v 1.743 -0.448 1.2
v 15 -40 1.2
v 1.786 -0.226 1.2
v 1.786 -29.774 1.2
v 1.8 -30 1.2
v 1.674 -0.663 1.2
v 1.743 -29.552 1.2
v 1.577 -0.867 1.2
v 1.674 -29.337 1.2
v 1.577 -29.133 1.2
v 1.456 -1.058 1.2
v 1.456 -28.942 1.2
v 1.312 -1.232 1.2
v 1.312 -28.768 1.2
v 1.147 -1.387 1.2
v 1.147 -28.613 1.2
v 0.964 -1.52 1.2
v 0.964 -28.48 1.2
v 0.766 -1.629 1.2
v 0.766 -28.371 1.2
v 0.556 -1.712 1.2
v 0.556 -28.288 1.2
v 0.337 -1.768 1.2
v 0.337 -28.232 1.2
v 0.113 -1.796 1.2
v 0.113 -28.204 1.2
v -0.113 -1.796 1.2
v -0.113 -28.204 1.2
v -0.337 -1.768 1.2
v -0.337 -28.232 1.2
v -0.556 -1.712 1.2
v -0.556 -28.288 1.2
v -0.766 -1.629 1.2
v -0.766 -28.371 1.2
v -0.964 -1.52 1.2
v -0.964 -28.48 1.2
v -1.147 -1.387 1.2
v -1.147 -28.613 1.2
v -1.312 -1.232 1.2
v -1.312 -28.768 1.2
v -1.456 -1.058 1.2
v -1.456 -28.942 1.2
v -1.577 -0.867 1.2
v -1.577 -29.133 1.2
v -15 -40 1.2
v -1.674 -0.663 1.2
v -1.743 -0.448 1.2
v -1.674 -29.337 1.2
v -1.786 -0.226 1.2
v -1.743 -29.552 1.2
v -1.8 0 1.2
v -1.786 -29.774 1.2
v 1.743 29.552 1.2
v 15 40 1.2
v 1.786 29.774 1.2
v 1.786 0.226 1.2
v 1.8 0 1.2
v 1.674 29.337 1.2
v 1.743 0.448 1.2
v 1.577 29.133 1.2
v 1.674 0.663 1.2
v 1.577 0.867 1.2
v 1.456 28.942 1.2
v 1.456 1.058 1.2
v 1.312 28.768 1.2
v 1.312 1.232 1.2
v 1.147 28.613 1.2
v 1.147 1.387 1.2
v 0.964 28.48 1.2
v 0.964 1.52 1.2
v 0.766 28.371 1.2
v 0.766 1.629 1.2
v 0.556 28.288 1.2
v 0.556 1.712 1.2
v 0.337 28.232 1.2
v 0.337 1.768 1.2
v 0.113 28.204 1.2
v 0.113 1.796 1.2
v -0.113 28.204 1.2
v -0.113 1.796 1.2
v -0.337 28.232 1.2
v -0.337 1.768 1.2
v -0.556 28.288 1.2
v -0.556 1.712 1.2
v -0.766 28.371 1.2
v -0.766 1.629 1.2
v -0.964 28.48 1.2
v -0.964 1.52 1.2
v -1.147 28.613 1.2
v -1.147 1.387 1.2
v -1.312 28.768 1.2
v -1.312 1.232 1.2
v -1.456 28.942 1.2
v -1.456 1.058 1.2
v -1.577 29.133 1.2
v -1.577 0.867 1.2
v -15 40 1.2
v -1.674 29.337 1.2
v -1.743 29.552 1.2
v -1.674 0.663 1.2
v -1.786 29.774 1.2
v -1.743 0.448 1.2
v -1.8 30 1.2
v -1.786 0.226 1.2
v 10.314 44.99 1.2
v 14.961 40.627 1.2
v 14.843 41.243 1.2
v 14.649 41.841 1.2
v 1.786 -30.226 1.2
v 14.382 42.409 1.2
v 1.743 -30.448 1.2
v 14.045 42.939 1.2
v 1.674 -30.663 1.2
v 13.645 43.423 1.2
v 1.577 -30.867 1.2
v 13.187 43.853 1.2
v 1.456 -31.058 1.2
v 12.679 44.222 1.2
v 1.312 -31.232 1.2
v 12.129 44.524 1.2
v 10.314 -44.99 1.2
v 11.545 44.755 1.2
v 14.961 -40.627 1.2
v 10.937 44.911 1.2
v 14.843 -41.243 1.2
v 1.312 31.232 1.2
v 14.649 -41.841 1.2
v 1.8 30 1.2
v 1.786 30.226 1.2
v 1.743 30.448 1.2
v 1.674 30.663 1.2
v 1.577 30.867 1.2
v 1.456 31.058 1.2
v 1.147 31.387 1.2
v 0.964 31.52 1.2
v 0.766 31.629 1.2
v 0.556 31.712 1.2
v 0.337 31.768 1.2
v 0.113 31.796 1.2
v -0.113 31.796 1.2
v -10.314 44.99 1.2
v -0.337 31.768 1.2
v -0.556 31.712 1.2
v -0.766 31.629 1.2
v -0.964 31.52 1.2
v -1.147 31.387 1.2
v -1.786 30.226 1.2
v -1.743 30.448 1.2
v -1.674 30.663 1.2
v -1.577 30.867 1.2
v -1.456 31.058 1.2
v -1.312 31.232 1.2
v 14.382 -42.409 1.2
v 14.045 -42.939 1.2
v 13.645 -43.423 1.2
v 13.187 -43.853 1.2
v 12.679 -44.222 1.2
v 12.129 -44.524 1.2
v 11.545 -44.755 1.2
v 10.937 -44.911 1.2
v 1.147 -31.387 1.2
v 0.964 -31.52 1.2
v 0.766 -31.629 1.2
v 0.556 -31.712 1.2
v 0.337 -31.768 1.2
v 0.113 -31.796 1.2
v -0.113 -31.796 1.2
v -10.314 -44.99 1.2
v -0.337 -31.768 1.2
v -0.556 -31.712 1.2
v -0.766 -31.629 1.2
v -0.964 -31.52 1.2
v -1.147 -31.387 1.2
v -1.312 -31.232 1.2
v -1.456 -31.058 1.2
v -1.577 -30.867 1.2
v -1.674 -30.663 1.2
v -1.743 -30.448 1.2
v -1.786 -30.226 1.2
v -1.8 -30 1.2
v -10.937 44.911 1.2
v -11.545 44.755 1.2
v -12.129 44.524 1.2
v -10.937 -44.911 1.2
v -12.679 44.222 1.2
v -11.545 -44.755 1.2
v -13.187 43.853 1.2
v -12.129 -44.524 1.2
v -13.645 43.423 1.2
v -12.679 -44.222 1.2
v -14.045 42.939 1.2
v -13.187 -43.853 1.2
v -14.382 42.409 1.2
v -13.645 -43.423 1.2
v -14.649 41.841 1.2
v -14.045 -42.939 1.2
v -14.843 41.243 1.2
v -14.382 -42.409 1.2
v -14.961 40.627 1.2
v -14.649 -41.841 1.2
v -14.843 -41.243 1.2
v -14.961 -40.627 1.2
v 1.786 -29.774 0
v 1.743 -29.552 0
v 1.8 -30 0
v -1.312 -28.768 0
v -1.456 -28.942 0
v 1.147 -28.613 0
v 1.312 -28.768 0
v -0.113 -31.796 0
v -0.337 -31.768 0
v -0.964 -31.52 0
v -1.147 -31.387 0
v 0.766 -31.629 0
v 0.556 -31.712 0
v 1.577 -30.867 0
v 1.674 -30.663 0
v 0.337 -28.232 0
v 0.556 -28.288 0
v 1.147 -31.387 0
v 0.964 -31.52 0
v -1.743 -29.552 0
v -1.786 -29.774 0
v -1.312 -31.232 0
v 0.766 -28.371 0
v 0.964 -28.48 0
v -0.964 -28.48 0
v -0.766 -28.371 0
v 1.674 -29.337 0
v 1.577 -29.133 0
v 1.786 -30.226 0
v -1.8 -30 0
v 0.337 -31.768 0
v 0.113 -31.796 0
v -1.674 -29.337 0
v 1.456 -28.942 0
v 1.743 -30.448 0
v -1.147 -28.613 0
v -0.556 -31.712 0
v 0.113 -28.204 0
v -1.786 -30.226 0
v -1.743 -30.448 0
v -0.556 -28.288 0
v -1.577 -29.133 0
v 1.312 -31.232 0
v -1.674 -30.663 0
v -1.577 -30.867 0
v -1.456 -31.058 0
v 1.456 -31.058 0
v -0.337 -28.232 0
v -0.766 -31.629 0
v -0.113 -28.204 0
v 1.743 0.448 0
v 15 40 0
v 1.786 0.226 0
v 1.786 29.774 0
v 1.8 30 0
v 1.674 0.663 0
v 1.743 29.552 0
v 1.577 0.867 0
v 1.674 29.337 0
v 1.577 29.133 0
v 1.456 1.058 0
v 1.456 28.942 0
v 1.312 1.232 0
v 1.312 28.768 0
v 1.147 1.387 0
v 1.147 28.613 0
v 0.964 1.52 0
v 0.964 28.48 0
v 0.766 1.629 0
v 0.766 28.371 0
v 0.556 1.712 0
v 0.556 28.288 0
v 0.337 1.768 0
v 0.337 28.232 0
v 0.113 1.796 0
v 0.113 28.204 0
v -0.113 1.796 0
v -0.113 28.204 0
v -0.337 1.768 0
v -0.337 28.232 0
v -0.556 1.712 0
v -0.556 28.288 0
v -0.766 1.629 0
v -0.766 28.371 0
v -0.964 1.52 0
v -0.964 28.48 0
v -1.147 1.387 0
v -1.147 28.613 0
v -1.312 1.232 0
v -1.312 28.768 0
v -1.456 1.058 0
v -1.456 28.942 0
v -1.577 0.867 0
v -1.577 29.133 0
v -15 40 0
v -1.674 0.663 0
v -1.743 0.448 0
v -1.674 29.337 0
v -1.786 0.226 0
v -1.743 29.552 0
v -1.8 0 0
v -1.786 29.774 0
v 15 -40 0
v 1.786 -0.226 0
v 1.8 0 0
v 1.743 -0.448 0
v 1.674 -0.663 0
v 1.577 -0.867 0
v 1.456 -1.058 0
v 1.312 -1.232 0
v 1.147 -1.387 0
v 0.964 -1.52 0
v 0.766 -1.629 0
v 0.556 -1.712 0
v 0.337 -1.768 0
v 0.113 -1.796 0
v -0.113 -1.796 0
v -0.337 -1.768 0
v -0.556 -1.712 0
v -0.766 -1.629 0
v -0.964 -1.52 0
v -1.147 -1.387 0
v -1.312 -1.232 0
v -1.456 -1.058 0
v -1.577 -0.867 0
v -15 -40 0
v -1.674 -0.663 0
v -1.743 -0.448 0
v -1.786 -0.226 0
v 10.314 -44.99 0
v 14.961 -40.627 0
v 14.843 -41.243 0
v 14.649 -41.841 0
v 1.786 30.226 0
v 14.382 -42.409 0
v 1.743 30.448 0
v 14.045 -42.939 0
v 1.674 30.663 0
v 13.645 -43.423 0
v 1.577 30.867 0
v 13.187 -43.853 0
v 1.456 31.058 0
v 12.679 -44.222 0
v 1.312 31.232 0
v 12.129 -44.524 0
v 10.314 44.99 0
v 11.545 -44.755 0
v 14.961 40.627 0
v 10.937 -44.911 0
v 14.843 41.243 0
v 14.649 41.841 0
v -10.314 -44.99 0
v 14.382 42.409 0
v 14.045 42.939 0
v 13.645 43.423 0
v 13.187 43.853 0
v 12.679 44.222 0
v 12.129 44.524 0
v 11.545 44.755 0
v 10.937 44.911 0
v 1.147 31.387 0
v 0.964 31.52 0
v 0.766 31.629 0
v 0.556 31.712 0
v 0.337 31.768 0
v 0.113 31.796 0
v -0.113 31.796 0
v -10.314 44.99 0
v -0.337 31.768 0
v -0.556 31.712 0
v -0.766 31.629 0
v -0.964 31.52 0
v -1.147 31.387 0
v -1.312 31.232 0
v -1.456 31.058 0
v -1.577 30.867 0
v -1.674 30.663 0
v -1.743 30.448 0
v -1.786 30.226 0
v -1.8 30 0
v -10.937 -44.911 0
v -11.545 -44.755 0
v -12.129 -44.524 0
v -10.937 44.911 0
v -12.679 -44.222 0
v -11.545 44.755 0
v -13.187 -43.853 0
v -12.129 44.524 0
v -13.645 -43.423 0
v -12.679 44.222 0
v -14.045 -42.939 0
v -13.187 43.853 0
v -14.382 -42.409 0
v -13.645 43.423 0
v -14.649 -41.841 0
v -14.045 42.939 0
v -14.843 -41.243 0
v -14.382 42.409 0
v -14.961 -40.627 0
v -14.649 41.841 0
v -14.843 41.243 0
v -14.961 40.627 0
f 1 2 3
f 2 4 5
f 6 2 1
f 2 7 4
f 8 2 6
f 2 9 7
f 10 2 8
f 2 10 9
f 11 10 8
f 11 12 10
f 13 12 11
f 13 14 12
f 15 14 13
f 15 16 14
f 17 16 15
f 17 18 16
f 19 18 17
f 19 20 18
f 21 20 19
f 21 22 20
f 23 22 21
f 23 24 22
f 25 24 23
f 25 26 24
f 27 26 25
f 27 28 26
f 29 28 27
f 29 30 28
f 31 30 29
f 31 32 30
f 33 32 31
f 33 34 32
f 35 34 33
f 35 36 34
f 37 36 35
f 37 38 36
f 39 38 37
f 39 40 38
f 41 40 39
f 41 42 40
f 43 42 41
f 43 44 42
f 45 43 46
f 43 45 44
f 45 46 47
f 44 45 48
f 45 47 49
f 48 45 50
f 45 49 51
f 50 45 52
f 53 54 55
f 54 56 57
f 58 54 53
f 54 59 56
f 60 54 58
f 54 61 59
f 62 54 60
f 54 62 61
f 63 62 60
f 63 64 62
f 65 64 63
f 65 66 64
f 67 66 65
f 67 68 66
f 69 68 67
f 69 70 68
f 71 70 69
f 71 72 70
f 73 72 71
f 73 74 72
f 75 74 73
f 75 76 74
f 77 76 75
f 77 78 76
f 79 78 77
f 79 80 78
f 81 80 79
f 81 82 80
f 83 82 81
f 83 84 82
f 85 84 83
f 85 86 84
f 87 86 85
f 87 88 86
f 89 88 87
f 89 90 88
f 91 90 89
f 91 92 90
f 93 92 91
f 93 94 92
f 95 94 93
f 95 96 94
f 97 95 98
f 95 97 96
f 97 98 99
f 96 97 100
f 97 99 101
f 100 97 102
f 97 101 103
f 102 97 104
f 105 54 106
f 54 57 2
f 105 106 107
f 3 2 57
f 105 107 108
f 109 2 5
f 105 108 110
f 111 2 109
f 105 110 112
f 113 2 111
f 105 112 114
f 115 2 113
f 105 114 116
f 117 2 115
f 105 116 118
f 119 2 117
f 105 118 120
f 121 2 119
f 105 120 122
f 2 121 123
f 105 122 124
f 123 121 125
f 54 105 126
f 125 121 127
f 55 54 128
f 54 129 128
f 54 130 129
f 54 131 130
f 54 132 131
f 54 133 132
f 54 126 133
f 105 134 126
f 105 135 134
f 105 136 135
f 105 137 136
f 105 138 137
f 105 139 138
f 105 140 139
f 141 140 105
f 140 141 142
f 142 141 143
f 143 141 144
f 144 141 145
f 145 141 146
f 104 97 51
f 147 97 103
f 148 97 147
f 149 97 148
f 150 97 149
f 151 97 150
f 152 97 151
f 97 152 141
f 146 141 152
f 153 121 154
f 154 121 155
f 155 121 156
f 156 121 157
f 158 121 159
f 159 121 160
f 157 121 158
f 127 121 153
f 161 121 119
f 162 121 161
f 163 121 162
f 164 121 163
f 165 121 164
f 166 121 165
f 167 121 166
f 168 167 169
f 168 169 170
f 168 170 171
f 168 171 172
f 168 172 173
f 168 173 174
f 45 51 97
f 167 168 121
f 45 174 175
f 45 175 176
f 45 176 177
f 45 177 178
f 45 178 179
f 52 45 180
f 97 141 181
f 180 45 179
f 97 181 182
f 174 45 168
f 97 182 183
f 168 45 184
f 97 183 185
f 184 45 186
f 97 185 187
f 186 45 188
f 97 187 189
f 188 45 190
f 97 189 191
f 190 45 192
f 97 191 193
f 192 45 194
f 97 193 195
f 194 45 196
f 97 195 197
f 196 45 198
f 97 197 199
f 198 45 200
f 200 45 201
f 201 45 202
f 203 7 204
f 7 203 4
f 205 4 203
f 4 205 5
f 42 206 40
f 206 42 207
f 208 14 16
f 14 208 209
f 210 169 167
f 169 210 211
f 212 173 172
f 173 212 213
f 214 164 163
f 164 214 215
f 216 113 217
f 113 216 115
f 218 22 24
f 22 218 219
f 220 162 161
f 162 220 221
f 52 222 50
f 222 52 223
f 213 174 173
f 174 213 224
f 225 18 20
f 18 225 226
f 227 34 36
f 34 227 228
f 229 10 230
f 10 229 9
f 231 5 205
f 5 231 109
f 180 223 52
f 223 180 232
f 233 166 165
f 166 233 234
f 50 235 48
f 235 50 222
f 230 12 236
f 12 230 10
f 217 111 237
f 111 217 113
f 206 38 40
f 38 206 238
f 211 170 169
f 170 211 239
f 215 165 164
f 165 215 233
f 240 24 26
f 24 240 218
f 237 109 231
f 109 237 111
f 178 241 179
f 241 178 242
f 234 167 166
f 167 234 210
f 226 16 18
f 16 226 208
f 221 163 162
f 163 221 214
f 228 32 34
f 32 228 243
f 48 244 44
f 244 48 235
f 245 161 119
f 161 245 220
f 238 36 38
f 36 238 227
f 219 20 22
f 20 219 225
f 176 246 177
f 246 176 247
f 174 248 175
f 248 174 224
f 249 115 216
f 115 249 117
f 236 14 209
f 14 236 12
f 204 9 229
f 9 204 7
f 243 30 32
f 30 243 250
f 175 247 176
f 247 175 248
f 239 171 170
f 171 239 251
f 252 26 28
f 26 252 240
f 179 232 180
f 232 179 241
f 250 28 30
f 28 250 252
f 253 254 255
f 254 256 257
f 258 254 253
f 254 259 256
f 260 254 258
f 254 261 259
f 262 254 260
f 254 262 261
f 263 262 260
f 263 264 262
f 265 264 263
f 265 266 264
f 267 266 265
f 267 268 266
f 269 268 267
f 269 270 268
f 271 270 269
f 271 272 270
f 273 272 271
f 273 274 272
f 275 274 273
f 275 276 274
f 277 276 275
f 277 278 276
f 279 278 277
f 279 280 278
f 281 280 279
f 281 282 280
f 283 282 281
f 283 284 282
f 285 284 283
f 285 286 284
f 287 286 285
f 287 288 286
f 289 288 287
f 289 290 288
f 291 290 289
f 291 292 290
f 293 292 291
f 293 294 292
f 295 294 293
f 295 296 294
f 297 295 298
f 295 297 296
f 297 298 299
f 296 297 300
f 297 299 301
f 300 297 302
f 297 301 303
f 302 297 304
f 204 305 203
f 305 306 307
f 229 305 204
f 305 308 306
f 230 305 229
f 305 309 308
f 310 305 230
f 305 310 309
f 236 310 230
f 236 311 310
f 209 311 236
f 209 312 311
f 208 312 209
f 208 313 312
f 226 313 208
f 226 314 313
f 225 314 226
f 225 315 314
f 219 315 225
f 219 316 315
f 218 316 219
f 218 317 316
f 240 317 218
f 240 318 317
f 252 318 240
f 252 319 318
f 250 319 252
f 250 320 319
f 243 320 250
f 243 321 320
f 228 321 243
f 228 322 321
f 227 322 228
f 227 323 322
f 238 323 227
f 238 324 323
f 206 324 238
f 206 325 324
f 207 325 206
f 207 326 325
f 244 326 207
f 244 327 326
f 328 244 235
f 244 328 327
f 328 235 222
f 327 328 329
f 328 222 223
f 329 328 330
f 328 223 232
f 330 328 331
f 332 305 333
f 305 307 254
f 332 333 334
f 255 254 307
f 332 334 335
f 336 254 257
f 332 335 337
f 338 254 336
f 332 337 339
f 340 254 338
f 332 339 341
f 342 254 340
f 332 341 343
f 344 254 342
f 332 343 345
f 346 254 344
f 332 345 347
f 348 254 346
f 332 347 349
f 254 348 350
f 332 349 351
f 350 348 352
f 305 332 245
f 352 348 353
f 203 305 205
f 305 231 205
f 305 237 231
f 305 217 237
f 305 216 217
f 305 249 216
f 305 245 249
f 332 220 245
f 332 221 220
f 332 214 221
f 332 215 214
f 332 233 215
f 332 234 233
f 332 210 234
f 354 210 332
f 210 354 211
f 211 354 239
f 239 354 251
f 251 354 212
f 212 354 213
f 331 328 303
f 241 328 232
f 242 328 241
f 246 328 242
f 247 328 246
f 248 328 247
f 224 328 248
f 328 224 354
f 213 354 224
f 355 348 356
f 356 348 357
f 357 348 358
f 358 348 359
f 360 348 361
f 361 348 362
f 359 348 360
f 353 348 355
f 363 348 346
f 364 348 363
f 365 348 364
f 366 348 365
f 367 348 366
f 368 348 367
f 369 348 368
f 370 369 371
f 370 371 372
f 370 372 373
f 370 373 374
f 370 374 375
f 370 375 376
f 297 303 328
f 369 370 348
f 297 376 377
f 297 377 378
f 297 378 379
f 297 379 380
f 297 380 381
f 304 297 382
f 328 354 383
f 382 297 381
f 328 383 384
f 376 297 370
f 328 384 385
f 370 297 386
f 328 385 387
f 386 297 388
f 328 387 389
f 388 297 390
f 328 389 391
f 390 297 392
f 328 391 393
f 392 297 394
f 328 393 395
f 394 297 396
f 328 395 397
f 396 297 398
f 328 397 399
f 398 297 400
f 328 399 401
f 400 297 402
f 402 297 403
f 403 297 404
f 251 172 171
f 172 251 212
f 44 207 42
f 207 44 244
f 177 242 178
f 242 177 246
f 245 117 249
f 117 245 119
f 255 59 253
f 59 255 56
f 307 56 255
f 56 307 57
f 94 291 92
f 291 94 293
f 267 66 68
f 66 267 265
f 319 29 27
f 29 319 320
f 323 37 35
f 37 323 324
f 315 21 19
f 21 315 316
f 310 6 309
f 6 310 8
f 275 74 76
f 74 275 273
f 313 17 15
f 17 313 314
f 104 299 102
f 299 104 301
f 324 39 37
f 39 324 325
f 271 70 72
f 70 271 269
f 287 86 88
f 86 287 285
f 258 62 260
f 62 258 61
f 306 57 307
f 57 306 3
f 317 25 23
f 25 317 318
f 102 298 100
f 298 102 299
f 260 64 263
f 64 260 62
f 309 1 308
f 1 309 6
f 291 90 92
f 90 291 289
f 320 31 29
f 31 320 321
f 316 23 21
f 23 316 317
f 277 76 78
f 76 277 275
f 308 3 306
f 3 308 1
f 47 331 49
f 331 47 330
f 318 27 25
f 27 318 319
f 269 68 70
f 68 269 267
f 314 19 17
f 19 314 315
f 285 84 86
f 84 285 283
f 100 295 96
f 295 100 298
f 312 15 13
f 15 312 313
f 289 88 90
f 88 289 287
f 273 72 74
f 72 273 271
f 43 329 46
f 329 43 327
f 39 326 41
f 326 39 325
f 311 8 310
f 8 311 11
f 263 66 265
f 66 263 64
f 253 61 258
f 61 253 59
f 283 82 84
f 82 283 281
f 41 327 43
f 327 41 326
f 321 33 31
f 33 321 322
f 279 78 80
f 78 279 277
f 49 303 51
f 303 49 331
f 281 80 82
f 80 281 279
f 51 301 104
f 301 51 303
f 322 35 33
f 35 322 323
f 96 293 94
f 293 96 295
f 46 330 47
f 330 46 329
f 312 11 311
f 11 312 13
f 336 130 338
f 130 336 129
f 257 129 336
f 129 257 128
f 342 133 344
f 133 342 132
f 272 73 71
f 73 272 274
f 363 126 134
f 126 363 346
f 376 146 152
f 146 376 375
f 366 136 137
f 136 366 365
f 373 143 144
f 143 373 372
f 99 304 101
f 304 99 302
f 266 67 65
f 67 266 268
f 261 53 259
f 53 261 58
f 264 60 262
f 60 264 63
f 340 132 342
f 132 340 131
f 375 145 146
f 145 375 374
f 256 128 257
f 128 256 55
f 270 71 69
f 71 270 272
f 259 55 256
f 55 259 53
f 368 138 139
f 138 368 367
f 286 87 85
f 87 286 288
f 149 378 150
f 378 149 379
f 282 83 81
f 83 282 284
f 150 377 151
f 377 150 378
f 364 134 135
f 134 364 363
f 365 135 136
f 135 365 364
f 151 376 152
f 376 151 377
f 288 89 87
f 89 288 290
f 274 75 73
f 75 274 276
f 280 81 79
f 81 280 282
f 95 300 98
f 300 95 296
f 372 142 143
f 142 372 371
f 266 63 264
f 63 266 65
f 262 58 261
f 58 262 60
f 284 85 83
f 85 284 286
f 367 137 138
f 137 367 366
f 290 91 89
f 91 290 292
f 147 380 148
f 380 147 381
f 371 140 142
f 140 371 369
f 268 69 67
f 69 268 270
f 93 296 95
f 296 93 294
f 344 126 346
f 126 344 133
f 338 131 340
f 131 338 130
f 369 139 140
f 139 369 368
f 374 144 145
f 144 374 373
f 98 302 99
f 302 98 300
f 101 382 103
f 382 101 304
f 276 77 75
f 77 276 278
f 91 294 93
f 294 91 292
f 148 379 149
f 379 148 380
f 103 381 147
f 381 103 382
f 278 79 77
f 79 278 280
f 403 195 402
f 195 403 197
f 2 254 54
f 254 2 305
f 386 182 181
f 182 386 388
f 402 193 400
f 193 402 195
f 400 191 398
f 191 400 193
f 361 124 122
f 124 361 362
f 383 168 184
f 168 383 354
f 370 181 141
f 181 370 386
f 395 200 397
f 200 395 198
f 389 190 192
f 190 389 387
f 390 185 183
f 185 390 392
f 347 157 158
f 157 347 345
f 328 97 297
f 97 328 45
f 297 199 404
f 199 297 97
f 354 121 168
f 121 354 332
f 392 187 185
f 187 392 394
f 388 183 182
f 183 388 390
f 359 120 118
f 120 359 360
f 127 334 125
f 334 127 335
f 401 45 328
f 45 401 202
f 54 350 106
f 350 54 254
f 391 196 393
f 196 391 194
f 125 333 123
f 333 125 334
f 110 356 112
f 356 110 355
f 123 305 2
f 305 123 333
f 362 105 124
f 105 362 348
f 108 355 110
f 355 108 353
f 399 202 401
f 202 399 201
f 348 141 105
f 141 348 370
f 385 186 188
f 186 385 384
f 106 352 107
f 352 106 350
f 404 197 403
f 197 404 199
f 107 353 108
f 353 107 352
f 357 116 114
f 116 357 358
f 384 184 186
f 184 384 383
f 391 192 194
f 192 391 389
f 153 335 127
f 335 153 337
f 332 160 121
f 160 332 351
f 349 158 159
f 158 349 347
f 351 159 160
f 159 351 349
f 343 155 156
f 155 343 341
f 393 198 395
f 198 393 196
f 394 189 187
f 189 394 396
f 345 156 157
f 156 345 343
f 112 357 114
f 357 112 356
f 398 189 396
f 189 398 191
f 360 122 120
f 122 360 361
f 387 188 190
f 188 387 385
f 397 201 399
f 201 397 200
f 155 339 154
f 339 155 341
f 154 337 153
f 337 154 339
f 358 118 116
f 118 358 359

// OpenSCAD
$fn = 50;


difference() {
	union() {
		hull() {
			translate(v = [-10.0000000000, 40.0000000000, 0]) {
				cylinder(h = 45, r = 5);
			}
			translate(v = [10.0000000000, 40.0000000000, 0]) {
				cylinder(h = 45, r = 5);
			}
			translate(v = [-10.0000000000, -40.0000000000, 0]) {
				cylinder(h = 45, r = 5);
			}
			translate(v = [10.0000000000, -40.0000000000, 0]) {
				cylinder(h = 45, r = 5);
			}
		}
	}
	union() {
		translate(v = [0, 0, 1.2000000000]) {
			hull() {
				translate(v = [-10.0000000000, 40.0000000000, 0]) {
					cylinder(h = 43.8000000000, r = 3.8000000000);
				}
				translate(v = [10.0000000000, 40.0000000000, 0]) {
					cylinder(h = 43.8000000000, r = 3.8000000000);
				}
				translate(v = [-10.0000000000, -40.0000000000, 0]) {
					cylinder(h = 43.8000000000, r = 3.8000000000);
				}
				translate(v = [10.0000000000, -40.0000000000, 0]) {
					cylinder(h = 43.8000000000, r = 3.8000000000);
				}
			}
		}
		#translate(v = [0.0000000000, -30.0000000000, 0]) {
			cylinder(h = 1.2000000000, r = 1.8000000000);
		}
		#cylinder(h = 1.2000000000, r = 1.8000000000);
		#translate(v = [0.0000000000, 30.0000000000, 0]) {
			cylinder(h = 1.2000000000, r = 1.8000000000);
		}
		translate(v = [-250.0000000000, -250.0000000000, 1.2000000000]) {
			cube(size = [500, 500, 500]);
		}
		translate(v = [-250.0000000000, -250.0000000000, 1.2000000000]) {
			cube(size = [500, 500, 500]);
		}
		translate(v = [-250.0000000000, -250.0000000000, 1.2000000000]) {
			cube(size = [500, 500, 500]);
		}
	}
}
